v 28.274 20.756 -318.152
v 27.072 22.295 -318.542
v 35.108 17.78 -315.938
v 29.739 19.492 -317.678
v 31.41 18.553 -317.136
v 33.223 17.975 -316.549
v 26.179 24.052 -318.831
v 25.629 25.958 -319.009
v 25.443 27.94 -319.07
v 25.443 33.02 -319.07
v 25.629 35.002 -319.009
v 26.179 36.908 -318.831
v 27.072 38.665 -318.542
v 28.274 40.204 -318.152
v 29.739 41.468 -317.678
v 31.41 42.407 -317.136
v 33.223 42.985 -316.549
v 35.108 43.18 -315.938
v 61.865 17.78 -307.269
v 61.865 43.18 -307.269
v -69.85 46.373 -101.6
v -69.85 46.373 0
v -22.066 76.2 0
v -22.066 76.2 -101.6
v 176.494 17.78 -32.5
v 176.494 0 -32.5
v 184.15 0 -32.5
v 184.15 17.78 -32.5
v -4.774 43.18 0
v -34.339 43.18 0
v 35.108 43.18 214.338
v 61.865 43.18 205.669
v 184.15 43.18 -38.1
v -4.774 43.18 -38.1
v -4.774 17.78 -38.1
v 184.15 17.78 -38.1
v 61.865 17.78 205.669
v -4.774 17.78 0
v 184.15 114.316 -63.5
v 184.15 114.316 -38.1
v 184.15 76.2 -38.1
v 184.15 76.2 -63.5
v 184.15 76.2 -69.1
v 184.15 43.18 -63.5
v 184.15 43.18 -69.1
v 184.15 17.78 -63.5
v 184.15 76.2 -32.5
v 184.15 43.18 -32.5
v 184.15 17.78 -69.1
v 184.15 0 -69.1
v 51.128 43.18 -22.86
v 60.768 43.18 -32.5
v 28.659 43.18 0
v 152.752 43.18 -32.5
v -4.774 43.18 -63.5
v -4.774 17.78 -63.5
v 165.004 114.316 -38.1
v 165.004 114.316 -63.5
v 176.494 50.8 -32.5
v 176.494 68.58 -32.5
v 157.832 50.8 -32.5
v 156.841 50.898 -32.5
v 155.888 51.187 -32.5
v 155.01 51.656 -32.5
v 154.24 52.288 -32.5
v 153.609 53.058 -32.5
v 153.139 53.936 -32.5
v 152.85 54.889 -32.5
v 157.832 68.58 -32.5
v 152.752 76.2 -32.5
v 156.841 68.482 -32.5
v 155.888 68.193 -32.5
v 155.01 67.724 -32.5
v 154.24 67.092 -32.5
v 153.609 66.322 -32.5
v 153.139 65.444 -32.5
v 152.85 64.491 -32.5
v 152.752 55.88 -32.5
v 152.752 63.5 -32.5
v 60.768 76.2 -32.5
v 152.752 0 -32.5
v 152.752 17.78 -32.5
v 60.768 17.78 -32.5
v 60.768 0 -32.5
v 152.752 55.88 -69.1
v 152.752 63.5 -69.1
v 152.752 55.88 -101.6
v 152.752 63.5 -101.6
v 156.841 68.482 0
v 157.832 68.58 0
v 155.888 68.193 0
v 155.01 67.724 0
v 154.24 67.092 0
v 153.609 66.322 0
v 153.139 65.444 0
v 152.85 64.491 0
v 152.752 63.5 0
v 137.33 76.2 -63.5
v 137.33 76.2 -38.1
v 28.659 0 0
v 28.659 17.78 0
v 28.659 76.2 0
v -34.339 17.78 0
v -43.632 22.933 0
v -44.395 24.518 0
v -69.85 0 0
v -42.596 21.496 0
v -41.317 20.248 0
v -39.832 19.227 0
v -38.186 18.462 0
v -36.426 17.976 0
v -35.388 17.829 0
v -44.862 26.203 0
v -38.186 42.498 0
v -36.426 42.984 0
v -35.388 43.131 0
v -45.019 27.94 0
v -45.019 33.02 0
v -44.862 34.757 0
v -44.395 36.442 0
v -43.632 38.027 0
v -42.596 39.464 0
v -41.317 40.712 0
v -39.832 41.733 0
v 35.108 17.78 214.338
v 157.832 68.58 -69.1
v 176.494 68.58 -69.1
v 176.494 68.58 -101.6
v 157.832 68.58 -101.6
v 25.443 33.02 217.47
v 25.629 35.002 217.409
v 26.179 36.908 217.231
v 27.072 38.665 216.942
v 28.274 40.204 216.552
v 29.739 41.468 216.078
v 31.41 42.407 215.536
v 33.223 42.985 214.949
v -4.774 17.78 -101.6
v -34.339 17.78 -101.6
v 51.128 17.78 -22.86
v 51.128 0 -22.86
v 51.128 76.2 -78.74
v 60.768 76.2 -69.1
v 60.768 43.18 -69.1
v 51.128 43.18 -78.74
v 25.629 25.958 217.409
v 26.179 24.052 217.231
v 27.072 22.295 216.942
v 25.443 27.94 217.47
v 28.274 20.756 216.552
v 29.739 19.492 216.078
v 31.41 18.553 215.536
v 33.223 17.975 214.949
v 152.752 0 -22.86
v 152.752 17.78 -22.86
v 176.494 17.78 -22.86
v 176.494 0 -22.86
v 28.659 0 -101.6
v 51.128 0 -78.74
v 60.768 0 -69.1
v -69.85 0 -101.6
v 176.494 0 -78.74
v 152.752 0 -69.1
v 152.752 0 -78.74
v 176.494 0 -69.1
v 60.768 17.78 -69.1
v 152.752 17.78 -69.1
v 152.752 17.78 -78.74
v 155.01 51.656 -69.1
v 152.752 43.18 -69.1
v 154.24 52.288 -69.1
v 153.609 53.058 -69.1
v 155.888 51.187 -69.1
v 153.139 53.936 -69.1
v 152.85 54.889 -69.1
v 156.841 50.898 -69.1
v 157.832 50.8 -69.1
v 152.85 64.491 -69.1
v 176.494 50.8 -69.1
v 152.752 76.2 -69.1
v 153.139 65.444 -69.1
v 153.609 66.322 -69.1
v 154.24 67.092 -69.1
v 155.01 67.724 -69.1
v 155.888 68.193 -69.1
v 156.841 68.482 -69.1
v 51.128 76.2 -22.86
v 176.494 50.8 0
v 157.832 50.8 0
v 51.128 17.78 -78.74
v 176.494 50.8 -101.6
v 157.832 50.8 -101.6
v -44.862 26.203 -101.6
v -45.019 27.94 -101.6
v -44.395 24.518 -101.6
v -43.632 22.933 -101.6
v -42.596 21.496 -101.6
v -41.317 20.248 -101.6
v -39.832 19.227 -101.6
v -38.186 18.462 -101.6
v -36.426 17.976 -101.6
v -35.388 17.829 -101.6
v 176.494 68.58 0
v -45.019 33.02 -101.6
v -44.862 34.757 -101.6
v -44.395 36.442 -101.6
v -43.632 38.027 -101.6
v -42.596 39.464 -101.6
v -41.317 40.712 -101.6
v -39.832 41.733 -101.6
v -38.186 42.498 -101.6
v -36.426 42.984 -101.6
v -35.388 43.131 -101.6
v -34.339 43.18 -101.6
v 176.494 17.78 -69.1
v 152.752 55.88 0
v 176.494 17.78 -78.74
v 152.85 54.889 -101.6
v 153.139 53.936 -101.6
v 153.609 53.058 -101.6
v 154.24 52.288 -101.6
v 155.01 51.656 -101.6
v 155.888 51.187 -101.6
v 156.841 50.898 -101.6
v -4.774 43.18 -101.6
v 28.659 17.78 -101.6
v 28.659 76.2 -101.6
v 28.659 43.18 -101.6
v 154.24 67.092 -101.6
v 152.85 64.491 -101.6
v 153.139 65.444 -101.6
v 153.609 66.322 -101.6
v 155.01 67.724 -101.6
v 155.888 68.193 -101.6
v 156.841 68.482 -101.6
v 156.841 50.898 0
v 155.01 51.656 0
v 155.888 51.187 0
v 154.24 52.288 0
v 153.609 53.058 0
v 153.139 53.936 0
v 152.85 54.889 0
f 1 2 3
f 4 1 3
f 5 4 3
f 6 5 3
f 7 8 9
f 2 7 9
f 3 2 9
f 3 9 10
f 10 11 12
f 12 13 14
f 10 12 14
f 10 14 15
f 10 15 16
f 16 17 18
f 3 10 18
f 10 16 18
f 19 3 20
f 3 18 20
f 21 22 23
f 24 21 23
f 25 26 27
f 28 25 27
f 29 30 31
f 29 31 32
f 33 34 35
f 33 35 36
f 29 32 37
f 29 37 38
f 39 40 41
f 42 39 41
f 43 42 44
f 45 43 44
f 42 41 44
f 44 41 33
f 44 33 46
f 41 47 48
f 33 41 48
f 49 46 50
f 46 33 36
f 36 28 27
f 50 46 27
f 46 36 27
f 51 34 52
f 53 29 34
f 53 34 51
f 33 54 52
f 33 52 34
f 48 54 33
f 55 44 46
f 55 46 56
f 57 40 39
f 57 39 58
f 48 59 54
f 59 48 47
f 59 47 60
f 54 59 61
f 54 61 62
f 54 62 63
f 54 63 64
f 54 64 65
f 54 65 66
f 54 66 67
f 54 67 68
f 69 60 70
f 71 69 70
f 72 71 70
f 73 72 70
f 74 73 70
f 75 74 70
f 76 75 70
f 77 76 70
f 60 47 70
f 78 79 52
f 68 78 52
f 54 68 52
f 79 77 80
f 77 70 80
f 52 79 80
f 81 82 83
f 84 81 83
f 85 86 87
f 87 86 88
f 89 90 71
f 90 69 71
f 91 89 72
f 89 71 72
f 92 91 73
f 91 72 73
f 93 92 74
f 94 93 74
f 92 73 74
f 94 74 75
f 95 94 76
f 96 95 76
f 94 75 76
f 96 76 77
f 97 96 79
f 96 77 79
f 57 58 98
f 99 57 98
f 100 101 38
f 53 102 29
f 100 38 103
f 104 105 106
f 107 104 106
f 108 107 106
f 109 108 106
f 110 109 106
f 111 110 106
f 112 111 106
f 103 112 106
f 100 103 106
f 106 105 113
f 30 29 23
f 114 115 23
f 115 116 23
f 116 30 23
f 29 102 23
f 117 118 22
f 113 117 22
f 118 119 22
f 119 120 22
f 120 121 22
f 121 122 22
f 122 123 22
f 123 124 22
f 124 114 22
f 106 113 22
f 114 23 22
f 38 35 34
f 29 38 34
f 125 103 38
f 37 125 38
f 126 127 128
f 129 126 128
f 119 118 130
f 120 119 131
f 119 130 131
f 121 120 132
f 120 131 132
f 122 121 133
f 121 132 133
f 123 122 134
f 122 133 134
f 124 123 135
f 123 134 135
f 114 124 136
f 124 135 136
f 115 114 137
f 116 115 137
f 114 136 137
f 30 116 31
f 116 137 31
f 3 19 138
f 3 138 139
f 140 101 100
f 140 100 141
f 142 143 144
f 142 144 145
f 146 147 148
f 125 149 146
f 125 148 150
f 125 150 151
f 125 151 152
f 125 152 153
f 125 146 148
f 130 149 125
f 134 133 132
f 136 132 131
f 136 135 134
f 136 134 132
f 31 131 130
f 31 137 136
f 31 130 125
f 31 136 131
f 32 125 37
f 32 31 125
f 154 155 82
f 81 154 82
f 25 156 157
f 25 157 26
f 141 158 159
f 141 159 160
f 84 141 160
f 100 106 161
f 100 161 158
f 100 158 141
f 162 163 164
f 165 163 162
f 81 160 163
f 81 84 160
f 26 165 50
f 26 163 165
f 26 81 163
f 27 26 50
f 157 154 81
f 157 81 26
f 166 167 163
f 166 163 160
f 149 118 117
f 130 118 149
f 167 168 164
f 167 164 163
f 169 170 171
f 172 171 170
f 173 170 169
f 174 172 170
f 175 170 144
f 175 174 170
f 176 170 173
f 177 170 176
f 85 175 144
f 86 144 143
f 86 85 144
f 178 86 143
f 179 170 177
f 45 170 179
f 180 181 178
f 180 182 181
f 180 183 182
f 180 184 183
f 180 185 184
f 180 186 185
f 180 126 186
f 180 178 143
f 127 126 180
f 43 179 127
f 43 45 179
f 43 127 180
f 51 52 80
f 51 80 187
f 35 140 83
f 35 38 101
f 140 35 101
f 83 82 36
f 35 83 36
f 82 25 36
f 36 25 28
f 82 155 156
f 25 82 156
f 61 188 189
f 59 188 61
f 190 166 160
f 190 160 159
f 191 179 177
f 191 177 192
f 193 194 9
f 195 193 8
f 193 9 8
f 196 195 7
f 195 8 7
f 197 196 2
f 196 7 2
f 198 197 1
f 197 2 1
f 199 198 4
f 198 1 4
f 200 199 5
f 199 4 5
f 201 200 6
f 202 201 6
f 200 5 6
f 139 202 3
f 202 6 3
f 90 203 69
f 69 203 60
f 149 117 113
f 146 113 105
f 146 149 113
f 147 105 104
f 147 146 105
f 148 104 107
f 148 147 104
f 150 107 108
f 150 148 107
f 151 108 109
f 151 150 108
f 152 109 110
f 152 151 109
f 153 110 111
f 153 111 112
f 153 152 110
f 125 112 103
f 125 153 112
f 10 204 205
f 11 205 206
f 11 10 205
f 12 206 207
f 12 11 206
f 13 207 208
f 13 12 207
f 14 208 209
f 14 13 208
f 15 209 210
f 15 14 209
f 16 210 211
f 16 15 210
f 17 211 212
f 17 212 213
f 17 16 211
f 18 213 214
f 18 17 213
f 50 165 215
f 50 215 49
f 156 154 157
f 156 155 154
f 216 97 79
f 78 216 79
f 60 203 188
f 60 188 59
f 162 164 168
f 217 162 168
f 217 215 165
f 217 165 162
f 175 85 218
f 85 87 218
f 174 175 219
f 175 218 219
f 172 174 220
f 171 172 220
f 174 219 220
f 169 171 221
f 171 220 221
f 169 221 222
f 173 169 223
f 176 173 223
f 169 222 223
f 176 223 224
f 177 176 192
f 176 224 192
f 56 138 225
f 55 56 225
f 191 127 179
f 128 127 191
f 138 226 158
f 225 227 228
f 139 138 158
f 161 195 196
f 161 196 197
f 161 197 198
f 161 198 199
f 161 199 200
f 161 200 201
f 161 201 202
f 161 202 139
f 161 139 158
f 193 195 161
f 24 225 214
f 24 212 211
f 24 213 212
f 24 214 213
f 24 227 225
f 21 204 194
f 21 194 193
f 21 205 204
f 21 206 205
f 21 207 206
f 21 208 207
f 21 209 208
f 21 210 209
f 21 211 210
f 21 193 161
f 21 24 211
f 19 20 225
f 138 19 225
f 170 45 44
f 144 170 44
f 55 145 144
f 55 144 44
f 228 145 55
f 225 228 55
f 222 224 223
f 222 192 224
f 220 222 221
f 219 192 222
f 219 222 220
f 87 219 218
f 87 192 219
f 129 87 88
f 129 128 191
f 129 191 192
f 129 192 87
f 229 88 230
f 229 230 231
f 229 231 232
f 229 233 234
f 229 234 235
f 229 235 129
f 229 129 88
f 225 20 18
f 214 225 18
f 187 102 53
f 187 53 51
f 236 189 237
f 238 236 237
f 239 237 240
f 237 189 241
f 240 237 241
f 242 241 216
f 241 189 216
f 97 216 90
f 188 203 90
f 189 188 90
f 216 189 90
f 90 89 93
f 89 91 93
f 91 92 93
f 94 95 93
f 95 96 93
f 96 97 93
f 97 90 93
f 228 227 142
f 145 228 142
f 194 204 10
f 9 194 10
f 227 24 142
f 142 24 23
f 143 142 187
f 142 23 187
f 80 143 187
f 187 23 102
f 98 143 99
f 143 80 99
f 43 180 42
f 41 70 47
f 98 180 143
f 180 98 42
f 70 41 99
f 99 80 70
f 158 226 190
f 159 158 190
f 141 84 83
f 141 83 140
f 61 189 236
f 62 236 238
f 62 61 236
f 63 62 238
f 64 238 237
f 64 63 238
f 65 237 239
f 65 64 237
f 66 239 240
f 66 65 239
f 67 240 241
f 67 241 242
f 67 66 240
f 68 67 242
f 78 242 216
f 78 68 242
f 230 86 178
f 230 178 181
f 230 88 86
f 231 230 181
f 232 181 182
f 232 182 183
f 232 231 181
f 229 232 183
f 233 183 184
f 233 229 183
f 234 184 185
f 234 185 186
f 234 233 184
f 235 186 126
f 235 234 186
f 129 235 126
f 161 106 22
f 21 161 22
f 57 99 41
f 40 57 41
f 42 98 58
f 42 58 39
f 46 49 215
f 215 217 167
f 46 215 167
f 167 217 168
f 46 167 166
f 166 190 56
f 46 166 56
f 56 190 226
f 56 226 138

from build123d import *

# Parameters (mm, degrees)
BOSS_EXTRUDE1_DEPTH = 101.6
BOSS_EXTRUDE2_START = -33.02
BOSS_EXTRUDE2_DEPTH = 25.4
SKETCH4_W           = 195.058436962
SKETCH4_H           = 25.4
CUT_EXTRUDE1_DEPTH  = 38.1
SKETCH5_W           = 191.898505545
SKETCH5_H           = 25.4
CUT_EXTRUDE4_DEPTH  = 38.1
CUT_EXTRUDE5_DEPTH  = 101.6
BOSS_EXTRUDE3_START = -63.5
BOSS_EXTRUDE3_DEPTH = 25.4
FILLET1_R           = 10.16
FILLET2_R           = 10.16
FILLET3_R           = 10.16
FILLET4_R           = 10.16
SKETCH9_W           = 22.86
SKETCH9_H           = 17.78
CUT_EXTRUDE6_DEPTH  = 50.8
SKETCH10_W          = 7.656009699
SKETCH10_H          = 32.499666645
CUT_EXTRUDE7_DEPTH  = 77.2
CUT_EXTRUDE8_DEPTH  = 77.2
SKETCH12_W          = 32.499666645
SKETCH12_H          = 7.62
CUT_EXTRUDE9_DEPTH  = 50.8
FILLET6_R           = 5.08


with BuildPart() as part:
    # Sketch1 → Boss-Extrude1 (new body)
    with BuildSketch(Plane.XY):
        Polygon((0, 0), (-69.85, 0), (-69.85, 46.373441022), (-22.065879406, 76.2), (184.15, 76.2), (184.15, 0), align=None)
    extrude(amount=-BOSS_EXTRUDE1_DEPTH)

    # Sketch3 → Boss-Extrude2 (add)
    with BuildSketch(Plane(origin=(0, 76.2, 0), x_dir=(1, 0, 0), z_dir=(0, 1, 0)).offset(BOSS_EXTRUDE2_START)):
        Polygon((-45.019314853, 101.6), (25.443042364, 319.069575379), (61.864542757, 307.268638321), (-4.774190667, 101.6), align=None)
        Polygon((-4.774190667, 0), (-45.019314853, 0), (25.443042364, -217.469575379), (61.864542757, -205.668638321), align=None)
    extrude(amount=-BOSS_EXTRUDE2_DEPTH)

    # Sketch4 → Cut-Extrude1 (cut)
    with BuildSketch(Plane.XY):
        with Locations((92.755027814, 30.48)):
            Rectangle(SKETCH4_W, SKETCH4_H)
    extrude(amount=-CUT_EXTRUDE1_DEPTH, mode=Mode.SUBTRACT)

    # Sketch5 → Cut-Extrude4 (cut)
    with BuildSketch(Plane(origin=(0, 0, -101.6), x_dir=(-1, 0, 0), z_dir=(0, 0, -1))):
        with Locations((-91.175062106, 30.48)):
            Rectangle(SKETCH5_W, SKETCH5_H)
    extrude(amount=-CUT_EXTRUDE4_DEPTH, mode=Mode.SUBTRACT)

    # Sketch6 → Cut-Extrude5 (cut)
    with BuildSketch(Plane(origin=(0, 76.2, 0), x_dir=(1, 0, 0), z_dir=(0, 1, 0))):
        Polygon((28.659266364, 0), (51.128382236, 22.86), (152.752463445, 22.86), (152.752463445, 0), align=None)
        Polygon((152.752463445, 78.74), (152.752463445, 101.6), (28.659266364, 101.6), (51.128382236, 78.74), align=None)
    extrude(amount=-CUT_EXTRUDE5_DEPTH, mode=Mode.SUBTRACT)

    # Sketch8 → Boss-Extrude3 (add)
    with BuildSketch(Plane.XY.offset(BOSS_EXTRUDE3_START)):
        Polygon((184.15, 76.2), (184.15, 114.315616278), (165.003698403, 114.315616278), (137.329725858, 76.2), align=None)
    extrude(amount=BOSS_EXTRUDE3_DEPTH)

    # Fillet1
    fillet1_edges = [part.edges().sort_by_distance(p)[0] for p in [
        (-9.788136245, 43.18, 108.734787689),
    ]]
    fillet(fillet1_edges, radius=FILLET1_R)

    # Fillet2
    fillet2_edges = [part.edges().sort_by_distance(p)[0] for p in [
        (-9.788136245, 17.78, 108.734787689),
    ]]
    fillet(fillet2_edges, radius=FILLET2_R)

    # Fillet3
    fillet3_edges = [part.edges().sort_by_distance(p)[0] for p in [
        (-9.788136245, 43.18, -210.334787689),
    ]]
    fillet(fillet3_edges, radius=FILLET3_R)

    # Fillet4
    fillet4_edges = [part.edges().sort_by_distance(p)[0] for p in [
        (-9.788136245, 17.78, -210.334787689),
    ]]
    fillet(fillet4_edges, radius=FILLET4_R)

    # Sketch9 → Cut-Extrude6 (cut)
    with BuildSketch(Plane(origin=(184.15, 0, 0), x_dir=(0, 0, -1), z_dir=(1, 0, 0))):
        with Locations((90.17, 8.89)):
            Rectangle(SKETCH9_W, SKETCH9_H)
        with Locations((11.43, 8.89)):
            Rectangle(SKETCH9_W, SKETCH9_H)
    extrude(amount=-CUT_EXTRUDE6_DEPTH, mode=Mode.SUBTRACT)

    # Sketch10 → Cut-Extrude7 (cut, through all)
    with BuildSketch(Plane(origin=(0, 76.2, 0), x_dir=(1, 0, 0), z_dir=(0, 1, 0))):
        with Locations((180.321995151, 16.249833323)):
            Rectangle(SKETCH10_W, SKETCH10_H)
        with Locations((180.321995151, 85.350166677)):
            Rectangle(SKETCH10_W, SKETCH10_H)
    extrude(amount=-CUT_EXTRUDE7_DEPTH, mode=Mode.SUBTRACT)

    # Sketch11 → Cut-Extrude8 (cut, through all)
    with BuildSketch(Plane(origin=(0, 76.2, 0), x_dir=(1, 0, 0), z_dir=(0, 1, 0))):
        Polygon((152.752463445, 22.86), (152.752463445, 32.499666645), (60.768048881, 32.499666645), (51.128382236, 22.86), align=None)
        Polygon((152.752463445, 78.74), (152.752463445, 69.100333355), (60.768048881, 69.100333355), (51.128382236, 78.74), align=None)
    extrude(amount=-CUT_EXTRUDE8_DEPTH, mode=Mode.SUBTRACT)

    # Sketch12 → Cut-Extrude9 (cut)
    with BuildSketch(Plane(origin=(176.493990301, 0, 0), x_dir=(0, 0, -1), z_dir=(1, 0, 0))):
        with Locations((85.350166677, 72.39)):
            Rectangle(SKETCH12_W, SKETCH12_H)
        with Locations((85.350166677, 46.99)):
            Rectangle(SKETCH12_W, SKETCH12_H)
        with Locations((16.249833323, 46.99)):
            Rectangle(SKETCH12_W, SKETCH12_H)
        with Locations((16.249833323, 72.39)):
            Rectangle(SKETCH12_W, SKETCH12_H)
    extrude(amount=-CUT_EXTRUDE9_DEPTH, mode=Mode.SUBTRACT)

    # Fillet6
    fillet6_edges = [part.edges().sort_by_distance(p)[0] for p in [
        (152.752463445, 68.58, -16.249833323),
        (152.752463445, 50.8, -16.249833323),
        (152.752463445, 50.8, -85.350166677),
        (152.752463445, 68.58, -85.350166677),
    ]]
    fillet(fillet6_edges, radius=FILLET6_R)


solid = part.part
